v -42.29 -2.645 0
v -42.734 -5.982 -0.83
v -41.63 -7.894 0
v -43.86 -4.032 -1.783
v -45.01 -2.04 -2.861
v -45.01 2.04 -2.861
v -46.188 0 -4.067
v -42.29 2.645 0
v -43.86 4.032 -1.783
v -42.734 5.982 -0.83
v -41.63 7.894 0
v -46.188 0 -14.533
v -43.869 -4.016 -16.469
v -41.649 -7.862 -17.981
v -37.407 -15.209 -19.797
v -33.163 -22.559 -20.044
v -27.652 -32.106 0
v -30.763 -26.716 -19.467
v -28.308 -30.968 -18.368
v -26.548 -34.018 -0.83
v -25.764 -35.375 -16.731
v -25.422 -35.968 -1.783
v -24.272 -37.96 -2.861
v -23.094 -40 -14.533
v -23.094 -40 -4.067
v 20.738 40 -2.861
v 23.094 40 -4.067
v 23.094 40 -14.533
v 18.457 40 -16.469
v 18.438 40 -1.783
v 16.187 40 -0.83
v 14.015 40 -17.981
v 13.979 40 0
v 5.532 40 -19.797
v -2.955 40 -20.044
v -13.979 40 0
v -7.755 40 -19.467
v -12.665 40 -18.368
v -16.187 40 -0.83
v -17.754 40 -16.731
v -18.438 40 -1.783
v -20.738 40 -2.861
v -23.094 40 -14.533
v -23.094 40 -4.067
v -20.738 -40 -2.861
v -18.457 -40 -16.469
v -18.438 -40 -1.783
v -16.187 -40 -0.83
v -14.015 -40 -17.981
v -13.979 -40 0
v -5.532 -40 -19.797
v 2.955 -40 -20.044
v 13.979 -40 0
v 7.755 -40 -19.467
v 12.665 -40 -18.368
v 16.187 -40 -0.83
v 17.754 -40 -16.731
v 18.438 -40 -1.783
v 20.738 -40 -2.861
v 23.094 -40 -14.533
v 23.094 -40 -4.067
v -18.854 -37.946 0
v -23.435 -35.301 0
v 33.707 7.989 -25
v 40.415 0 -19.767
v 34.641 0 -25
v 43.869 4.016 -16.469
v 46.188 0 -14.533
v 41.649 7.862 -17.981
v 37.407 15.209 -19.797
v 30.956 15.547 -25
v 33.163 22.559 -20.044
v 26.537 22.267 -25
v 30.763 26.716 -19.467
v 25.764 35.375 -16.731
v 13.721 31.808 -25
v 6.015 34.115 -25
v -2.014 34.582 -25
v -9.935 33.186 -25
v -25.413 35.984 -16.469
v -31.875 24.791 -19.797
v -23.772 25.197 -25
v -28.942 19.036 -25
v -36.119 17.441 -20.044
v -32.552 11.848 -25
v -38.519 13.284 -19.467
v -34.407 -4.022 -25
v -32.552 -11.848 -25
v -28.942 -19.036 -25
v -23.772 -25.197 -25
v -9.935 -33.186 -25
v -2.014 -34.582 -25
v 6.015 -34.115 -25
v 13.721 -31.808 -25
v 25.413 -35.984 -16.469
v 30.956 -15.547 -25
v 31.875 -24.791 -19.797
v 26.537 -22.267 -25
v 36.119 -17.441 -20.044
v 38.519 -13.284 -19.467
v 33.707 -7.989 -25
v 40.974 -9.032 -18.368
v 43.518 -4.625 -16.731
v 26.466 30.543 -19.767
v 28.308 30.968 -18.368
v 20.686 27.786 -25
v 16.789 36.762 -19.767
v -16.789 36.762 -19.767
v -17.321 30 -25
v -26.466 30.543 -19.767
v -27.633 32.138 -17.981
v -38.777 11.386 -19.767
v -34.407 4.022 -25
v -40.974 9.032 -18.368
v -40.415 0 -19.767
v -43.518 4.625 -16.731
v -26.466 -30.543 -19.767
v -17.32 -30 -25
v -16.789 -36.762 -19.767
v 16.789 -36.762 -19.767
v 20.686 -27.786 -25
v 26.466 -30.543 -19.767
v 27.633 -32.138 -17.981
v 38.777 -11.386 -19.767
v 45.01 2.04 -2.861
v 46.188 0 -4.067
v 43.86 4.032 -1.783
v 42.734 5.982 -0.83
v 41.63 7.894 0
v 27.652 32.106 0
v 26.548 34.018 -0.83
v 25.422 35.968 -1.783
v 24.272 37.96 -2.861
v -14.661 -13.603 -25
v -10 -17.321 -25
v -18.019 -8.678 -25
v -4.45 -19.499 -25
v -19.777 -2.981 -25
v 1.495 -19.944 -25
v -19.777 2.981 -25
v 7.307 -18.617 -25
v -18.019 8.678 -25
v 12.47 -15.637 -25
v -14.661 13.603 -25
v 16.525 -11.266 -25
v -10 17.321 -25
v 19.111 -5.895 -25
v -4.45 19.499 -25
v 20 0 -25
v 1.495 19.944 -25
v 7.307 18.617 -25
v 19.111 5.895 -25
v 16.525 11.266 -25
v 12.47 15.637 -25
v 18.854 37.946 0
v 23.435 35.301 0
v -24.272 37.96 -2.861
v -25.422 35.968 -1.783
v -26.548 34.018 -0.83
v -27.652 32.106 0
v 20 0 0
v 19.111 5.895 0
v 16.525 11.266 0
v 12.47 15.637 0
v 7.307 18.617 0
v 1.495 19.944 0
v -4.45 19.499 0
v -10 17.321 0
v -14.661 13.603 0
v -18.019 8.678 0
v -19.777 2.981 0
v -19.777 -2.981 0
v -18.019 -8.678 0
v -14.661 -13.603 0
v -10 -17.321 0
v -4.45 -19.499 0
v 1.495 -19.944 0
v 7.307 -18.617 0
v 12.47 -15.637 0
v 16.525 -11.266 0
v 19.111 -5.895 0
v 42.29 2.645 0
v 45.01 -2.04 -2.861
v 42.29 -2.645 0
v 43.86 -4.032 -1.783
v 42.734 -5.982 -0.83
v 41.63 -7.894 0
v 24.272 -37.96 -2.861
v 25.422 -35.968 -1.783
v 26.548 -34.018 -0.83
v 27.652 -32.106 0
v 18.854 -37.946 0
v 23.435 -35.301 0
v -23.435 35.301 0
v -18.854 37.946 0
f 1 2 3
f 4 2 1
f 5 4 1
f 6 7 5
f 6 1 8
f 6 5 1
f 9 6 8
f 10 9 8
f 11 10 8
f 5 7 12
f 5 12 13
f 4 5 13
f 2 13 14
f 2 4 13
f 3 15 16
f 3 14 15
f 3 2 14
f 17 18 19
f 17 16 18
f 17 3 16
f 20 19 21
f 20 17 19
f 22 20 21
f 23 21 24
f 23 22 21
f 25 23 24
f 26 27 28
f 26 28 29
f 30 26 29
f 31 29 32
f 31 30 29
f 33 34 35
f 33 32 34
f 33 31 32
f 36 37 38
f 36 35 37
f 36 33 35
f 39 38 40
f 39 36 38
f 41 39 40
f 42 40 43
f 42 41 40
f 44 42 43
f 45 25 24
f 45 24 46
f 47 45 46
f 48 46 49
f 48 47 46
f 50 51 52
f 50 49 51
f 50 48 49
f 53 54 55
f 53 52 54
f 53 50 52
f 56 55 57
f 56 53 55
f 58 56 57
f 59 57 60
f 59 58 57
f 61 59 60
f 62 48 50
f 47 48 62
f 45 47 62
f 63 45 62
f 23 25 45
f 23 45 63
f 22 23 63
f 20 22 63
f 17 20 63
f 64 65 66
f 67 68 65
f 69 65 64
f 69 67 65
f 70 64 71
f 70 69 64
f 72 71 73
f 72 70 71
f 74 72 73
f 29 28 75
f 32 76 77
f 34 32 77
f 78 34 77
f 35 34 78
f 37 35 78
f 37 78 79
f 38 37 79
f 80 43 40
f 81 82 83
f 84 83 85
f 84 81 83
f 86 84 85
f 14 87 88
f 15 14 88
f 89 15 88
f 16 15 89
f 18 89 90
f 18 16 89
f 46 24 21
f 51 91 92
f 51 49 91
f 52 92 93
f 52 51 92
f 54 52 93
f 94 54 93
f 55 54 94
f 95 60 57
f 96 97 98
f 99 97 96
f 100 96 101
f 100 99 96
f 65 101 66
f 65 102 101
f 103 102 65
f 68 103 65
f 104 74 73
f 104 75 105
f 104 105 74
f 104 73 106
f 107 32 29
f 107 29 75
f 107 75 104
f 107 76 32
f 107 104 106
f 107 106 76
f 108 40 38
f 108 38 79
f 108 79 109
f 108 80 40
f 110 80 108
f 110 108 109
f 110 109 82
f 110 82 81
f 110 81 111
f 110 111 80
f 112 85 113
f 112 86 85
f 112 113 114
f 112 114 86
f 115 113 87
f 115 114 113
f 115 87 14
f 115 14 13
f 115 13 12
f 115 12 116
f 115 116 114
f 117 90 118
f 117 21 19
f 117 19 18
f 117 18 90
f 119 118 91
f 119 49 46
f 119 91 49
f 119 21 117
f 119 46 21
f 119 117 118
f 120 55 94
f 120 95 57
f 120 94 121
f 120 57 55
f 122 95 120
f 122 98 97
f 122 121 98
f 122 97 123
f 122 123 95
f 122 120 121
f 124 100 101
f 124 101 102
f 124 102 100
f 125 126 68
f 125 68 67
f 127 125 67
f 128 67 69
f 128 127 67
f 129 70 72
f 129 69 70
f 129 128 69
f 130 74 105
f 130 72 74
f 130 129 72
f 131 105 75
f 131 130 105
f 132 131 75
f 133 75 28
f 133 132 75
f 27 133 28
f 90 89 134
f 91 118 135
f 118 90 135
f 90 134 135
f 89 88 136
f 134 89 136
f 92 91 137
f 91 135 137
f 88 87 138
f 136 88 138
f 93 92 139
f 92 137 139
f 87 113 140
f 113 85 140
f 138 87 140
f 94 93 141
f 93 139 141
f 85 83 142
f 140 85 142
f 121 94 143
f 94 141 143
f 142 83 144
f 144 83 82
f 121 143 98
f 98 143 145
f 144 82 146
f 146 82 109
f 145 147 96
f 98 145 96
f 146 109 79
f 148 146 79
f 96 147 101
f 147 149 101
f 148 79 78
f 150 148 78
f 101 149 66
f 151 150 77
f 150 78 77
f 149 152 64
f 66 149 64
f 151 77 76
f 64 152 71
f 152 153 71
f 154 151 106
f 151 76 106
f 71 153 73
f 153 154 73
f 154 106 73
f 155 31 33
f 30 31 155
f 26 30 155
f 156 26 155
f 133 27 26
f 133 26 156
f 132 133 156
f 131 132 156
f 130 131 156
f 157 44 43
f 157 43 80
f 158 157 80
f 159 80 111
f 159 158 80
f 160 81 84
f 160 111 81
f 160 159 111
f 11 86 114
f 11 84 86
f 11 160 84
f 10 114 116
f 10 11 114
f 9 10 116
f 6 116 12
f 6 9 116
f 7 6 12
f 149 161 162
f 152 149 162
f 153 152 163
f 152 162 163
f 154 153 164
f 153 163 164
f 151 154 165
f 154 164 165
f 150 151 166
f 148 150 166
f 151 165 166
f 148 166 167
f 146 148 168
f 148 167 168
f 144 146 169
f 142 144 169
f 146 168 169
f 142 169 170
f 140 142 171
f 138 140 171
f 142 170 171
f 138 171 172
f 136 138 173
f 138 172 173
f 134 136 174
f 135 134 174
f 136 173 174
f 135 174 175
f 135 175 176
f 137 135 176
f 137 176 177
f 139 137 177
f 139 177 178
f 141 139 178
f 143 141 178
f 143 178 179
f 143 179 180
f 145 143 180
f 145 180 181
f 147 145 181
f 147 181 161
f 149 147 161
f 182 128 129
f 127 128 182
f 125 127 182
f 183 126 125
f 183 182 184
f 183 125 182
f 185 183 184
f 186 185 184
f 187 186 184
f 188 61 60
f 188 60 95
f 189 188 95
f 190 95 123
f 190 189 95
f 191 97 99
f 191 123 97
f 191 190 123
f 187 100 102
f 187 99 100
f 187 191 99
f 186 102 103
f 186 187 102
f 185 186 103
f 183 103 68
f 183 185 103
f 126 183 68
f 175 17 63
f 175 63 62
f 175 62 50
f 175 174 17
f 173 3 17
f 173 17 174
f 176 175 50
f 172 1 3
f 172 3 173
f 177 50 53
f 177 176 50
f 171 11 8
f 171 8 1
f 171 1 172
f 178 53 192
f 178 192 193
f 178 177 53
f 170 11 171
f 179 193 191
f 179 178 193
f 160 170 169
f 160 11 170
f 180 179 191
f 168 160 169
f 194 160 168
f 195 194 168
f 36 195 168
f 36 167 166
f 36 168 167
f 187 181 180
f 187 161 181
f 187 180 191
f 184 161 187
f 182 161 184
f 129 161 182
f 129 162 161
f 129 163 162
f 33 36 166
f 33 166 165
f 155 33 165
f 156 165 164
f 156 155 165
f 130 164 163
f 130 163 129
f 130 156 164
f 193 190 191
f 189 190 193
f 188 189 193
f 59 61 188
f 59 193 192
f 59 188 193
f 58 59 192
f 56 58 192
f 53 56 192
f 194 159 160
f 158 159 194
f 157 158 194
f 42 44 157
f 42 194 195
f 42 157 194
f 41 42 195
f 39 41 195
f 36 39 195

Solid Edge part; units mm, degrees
sketch "Sketch1" plane through (0, 0, 0) normal (0, 0, 1) x (1, 0, 0)
  line L0 (-23.094, -40) -> (23.094, -40)
  line L1 (23.094, -40) -> (46.188, 0)
  line L2 (46.188, 0) -> (23.094, 40)
  line L3 (23.094, 40) -> (-23.094, 40)
  line L4 (-23.094, 40) -> (-46.188, 0)
  line L5 (-46.188, 0) -> (-23.094, -40)
extrude "Protrusion1" add sketch "Sketch1" against normal blind 25
sketch "Sketch2" plane through (0, 0, 0) normal (0, 0, 1) x (1, 0, 0)
  circle A0 centre (0, 0) radius 20
extrude "ExtrudedCutout_1" cut sketch "Sketch2" against normal blind 25
sketch "Sketch3" plane through (0, 0, 0) normal (0, -1, 0) x (1, 0, 0)
  line L0 (46.188, -4.0666) -> (42.3722, 0)
  line L1 (42.3722, 0) -> (46.188, 0)
  line L2 (46.188, 0) -> (46.188, -4.0666)
revolve "RevolvedCutout1" cut sketch "Sketch3" angle 360 about axis through (0, 0, 0) along (0, 0, 1)
sketch "Sketch4" plane through (0, 0, 0) normal (0, -1, 0) x (1, 0, 0)
  line L0 (34.641, -25) -> (46.188, -14.5333)
  line L1 (46.188, -25) -> (46.188, -14.5333)
  line L2 (46.188, -25) -> (34.641, -25)
revolve "RevolvedCutout2" cut sketch "Sketch4" angle 360 about axis through (0, 0, 0) along (0, 0, -1)
